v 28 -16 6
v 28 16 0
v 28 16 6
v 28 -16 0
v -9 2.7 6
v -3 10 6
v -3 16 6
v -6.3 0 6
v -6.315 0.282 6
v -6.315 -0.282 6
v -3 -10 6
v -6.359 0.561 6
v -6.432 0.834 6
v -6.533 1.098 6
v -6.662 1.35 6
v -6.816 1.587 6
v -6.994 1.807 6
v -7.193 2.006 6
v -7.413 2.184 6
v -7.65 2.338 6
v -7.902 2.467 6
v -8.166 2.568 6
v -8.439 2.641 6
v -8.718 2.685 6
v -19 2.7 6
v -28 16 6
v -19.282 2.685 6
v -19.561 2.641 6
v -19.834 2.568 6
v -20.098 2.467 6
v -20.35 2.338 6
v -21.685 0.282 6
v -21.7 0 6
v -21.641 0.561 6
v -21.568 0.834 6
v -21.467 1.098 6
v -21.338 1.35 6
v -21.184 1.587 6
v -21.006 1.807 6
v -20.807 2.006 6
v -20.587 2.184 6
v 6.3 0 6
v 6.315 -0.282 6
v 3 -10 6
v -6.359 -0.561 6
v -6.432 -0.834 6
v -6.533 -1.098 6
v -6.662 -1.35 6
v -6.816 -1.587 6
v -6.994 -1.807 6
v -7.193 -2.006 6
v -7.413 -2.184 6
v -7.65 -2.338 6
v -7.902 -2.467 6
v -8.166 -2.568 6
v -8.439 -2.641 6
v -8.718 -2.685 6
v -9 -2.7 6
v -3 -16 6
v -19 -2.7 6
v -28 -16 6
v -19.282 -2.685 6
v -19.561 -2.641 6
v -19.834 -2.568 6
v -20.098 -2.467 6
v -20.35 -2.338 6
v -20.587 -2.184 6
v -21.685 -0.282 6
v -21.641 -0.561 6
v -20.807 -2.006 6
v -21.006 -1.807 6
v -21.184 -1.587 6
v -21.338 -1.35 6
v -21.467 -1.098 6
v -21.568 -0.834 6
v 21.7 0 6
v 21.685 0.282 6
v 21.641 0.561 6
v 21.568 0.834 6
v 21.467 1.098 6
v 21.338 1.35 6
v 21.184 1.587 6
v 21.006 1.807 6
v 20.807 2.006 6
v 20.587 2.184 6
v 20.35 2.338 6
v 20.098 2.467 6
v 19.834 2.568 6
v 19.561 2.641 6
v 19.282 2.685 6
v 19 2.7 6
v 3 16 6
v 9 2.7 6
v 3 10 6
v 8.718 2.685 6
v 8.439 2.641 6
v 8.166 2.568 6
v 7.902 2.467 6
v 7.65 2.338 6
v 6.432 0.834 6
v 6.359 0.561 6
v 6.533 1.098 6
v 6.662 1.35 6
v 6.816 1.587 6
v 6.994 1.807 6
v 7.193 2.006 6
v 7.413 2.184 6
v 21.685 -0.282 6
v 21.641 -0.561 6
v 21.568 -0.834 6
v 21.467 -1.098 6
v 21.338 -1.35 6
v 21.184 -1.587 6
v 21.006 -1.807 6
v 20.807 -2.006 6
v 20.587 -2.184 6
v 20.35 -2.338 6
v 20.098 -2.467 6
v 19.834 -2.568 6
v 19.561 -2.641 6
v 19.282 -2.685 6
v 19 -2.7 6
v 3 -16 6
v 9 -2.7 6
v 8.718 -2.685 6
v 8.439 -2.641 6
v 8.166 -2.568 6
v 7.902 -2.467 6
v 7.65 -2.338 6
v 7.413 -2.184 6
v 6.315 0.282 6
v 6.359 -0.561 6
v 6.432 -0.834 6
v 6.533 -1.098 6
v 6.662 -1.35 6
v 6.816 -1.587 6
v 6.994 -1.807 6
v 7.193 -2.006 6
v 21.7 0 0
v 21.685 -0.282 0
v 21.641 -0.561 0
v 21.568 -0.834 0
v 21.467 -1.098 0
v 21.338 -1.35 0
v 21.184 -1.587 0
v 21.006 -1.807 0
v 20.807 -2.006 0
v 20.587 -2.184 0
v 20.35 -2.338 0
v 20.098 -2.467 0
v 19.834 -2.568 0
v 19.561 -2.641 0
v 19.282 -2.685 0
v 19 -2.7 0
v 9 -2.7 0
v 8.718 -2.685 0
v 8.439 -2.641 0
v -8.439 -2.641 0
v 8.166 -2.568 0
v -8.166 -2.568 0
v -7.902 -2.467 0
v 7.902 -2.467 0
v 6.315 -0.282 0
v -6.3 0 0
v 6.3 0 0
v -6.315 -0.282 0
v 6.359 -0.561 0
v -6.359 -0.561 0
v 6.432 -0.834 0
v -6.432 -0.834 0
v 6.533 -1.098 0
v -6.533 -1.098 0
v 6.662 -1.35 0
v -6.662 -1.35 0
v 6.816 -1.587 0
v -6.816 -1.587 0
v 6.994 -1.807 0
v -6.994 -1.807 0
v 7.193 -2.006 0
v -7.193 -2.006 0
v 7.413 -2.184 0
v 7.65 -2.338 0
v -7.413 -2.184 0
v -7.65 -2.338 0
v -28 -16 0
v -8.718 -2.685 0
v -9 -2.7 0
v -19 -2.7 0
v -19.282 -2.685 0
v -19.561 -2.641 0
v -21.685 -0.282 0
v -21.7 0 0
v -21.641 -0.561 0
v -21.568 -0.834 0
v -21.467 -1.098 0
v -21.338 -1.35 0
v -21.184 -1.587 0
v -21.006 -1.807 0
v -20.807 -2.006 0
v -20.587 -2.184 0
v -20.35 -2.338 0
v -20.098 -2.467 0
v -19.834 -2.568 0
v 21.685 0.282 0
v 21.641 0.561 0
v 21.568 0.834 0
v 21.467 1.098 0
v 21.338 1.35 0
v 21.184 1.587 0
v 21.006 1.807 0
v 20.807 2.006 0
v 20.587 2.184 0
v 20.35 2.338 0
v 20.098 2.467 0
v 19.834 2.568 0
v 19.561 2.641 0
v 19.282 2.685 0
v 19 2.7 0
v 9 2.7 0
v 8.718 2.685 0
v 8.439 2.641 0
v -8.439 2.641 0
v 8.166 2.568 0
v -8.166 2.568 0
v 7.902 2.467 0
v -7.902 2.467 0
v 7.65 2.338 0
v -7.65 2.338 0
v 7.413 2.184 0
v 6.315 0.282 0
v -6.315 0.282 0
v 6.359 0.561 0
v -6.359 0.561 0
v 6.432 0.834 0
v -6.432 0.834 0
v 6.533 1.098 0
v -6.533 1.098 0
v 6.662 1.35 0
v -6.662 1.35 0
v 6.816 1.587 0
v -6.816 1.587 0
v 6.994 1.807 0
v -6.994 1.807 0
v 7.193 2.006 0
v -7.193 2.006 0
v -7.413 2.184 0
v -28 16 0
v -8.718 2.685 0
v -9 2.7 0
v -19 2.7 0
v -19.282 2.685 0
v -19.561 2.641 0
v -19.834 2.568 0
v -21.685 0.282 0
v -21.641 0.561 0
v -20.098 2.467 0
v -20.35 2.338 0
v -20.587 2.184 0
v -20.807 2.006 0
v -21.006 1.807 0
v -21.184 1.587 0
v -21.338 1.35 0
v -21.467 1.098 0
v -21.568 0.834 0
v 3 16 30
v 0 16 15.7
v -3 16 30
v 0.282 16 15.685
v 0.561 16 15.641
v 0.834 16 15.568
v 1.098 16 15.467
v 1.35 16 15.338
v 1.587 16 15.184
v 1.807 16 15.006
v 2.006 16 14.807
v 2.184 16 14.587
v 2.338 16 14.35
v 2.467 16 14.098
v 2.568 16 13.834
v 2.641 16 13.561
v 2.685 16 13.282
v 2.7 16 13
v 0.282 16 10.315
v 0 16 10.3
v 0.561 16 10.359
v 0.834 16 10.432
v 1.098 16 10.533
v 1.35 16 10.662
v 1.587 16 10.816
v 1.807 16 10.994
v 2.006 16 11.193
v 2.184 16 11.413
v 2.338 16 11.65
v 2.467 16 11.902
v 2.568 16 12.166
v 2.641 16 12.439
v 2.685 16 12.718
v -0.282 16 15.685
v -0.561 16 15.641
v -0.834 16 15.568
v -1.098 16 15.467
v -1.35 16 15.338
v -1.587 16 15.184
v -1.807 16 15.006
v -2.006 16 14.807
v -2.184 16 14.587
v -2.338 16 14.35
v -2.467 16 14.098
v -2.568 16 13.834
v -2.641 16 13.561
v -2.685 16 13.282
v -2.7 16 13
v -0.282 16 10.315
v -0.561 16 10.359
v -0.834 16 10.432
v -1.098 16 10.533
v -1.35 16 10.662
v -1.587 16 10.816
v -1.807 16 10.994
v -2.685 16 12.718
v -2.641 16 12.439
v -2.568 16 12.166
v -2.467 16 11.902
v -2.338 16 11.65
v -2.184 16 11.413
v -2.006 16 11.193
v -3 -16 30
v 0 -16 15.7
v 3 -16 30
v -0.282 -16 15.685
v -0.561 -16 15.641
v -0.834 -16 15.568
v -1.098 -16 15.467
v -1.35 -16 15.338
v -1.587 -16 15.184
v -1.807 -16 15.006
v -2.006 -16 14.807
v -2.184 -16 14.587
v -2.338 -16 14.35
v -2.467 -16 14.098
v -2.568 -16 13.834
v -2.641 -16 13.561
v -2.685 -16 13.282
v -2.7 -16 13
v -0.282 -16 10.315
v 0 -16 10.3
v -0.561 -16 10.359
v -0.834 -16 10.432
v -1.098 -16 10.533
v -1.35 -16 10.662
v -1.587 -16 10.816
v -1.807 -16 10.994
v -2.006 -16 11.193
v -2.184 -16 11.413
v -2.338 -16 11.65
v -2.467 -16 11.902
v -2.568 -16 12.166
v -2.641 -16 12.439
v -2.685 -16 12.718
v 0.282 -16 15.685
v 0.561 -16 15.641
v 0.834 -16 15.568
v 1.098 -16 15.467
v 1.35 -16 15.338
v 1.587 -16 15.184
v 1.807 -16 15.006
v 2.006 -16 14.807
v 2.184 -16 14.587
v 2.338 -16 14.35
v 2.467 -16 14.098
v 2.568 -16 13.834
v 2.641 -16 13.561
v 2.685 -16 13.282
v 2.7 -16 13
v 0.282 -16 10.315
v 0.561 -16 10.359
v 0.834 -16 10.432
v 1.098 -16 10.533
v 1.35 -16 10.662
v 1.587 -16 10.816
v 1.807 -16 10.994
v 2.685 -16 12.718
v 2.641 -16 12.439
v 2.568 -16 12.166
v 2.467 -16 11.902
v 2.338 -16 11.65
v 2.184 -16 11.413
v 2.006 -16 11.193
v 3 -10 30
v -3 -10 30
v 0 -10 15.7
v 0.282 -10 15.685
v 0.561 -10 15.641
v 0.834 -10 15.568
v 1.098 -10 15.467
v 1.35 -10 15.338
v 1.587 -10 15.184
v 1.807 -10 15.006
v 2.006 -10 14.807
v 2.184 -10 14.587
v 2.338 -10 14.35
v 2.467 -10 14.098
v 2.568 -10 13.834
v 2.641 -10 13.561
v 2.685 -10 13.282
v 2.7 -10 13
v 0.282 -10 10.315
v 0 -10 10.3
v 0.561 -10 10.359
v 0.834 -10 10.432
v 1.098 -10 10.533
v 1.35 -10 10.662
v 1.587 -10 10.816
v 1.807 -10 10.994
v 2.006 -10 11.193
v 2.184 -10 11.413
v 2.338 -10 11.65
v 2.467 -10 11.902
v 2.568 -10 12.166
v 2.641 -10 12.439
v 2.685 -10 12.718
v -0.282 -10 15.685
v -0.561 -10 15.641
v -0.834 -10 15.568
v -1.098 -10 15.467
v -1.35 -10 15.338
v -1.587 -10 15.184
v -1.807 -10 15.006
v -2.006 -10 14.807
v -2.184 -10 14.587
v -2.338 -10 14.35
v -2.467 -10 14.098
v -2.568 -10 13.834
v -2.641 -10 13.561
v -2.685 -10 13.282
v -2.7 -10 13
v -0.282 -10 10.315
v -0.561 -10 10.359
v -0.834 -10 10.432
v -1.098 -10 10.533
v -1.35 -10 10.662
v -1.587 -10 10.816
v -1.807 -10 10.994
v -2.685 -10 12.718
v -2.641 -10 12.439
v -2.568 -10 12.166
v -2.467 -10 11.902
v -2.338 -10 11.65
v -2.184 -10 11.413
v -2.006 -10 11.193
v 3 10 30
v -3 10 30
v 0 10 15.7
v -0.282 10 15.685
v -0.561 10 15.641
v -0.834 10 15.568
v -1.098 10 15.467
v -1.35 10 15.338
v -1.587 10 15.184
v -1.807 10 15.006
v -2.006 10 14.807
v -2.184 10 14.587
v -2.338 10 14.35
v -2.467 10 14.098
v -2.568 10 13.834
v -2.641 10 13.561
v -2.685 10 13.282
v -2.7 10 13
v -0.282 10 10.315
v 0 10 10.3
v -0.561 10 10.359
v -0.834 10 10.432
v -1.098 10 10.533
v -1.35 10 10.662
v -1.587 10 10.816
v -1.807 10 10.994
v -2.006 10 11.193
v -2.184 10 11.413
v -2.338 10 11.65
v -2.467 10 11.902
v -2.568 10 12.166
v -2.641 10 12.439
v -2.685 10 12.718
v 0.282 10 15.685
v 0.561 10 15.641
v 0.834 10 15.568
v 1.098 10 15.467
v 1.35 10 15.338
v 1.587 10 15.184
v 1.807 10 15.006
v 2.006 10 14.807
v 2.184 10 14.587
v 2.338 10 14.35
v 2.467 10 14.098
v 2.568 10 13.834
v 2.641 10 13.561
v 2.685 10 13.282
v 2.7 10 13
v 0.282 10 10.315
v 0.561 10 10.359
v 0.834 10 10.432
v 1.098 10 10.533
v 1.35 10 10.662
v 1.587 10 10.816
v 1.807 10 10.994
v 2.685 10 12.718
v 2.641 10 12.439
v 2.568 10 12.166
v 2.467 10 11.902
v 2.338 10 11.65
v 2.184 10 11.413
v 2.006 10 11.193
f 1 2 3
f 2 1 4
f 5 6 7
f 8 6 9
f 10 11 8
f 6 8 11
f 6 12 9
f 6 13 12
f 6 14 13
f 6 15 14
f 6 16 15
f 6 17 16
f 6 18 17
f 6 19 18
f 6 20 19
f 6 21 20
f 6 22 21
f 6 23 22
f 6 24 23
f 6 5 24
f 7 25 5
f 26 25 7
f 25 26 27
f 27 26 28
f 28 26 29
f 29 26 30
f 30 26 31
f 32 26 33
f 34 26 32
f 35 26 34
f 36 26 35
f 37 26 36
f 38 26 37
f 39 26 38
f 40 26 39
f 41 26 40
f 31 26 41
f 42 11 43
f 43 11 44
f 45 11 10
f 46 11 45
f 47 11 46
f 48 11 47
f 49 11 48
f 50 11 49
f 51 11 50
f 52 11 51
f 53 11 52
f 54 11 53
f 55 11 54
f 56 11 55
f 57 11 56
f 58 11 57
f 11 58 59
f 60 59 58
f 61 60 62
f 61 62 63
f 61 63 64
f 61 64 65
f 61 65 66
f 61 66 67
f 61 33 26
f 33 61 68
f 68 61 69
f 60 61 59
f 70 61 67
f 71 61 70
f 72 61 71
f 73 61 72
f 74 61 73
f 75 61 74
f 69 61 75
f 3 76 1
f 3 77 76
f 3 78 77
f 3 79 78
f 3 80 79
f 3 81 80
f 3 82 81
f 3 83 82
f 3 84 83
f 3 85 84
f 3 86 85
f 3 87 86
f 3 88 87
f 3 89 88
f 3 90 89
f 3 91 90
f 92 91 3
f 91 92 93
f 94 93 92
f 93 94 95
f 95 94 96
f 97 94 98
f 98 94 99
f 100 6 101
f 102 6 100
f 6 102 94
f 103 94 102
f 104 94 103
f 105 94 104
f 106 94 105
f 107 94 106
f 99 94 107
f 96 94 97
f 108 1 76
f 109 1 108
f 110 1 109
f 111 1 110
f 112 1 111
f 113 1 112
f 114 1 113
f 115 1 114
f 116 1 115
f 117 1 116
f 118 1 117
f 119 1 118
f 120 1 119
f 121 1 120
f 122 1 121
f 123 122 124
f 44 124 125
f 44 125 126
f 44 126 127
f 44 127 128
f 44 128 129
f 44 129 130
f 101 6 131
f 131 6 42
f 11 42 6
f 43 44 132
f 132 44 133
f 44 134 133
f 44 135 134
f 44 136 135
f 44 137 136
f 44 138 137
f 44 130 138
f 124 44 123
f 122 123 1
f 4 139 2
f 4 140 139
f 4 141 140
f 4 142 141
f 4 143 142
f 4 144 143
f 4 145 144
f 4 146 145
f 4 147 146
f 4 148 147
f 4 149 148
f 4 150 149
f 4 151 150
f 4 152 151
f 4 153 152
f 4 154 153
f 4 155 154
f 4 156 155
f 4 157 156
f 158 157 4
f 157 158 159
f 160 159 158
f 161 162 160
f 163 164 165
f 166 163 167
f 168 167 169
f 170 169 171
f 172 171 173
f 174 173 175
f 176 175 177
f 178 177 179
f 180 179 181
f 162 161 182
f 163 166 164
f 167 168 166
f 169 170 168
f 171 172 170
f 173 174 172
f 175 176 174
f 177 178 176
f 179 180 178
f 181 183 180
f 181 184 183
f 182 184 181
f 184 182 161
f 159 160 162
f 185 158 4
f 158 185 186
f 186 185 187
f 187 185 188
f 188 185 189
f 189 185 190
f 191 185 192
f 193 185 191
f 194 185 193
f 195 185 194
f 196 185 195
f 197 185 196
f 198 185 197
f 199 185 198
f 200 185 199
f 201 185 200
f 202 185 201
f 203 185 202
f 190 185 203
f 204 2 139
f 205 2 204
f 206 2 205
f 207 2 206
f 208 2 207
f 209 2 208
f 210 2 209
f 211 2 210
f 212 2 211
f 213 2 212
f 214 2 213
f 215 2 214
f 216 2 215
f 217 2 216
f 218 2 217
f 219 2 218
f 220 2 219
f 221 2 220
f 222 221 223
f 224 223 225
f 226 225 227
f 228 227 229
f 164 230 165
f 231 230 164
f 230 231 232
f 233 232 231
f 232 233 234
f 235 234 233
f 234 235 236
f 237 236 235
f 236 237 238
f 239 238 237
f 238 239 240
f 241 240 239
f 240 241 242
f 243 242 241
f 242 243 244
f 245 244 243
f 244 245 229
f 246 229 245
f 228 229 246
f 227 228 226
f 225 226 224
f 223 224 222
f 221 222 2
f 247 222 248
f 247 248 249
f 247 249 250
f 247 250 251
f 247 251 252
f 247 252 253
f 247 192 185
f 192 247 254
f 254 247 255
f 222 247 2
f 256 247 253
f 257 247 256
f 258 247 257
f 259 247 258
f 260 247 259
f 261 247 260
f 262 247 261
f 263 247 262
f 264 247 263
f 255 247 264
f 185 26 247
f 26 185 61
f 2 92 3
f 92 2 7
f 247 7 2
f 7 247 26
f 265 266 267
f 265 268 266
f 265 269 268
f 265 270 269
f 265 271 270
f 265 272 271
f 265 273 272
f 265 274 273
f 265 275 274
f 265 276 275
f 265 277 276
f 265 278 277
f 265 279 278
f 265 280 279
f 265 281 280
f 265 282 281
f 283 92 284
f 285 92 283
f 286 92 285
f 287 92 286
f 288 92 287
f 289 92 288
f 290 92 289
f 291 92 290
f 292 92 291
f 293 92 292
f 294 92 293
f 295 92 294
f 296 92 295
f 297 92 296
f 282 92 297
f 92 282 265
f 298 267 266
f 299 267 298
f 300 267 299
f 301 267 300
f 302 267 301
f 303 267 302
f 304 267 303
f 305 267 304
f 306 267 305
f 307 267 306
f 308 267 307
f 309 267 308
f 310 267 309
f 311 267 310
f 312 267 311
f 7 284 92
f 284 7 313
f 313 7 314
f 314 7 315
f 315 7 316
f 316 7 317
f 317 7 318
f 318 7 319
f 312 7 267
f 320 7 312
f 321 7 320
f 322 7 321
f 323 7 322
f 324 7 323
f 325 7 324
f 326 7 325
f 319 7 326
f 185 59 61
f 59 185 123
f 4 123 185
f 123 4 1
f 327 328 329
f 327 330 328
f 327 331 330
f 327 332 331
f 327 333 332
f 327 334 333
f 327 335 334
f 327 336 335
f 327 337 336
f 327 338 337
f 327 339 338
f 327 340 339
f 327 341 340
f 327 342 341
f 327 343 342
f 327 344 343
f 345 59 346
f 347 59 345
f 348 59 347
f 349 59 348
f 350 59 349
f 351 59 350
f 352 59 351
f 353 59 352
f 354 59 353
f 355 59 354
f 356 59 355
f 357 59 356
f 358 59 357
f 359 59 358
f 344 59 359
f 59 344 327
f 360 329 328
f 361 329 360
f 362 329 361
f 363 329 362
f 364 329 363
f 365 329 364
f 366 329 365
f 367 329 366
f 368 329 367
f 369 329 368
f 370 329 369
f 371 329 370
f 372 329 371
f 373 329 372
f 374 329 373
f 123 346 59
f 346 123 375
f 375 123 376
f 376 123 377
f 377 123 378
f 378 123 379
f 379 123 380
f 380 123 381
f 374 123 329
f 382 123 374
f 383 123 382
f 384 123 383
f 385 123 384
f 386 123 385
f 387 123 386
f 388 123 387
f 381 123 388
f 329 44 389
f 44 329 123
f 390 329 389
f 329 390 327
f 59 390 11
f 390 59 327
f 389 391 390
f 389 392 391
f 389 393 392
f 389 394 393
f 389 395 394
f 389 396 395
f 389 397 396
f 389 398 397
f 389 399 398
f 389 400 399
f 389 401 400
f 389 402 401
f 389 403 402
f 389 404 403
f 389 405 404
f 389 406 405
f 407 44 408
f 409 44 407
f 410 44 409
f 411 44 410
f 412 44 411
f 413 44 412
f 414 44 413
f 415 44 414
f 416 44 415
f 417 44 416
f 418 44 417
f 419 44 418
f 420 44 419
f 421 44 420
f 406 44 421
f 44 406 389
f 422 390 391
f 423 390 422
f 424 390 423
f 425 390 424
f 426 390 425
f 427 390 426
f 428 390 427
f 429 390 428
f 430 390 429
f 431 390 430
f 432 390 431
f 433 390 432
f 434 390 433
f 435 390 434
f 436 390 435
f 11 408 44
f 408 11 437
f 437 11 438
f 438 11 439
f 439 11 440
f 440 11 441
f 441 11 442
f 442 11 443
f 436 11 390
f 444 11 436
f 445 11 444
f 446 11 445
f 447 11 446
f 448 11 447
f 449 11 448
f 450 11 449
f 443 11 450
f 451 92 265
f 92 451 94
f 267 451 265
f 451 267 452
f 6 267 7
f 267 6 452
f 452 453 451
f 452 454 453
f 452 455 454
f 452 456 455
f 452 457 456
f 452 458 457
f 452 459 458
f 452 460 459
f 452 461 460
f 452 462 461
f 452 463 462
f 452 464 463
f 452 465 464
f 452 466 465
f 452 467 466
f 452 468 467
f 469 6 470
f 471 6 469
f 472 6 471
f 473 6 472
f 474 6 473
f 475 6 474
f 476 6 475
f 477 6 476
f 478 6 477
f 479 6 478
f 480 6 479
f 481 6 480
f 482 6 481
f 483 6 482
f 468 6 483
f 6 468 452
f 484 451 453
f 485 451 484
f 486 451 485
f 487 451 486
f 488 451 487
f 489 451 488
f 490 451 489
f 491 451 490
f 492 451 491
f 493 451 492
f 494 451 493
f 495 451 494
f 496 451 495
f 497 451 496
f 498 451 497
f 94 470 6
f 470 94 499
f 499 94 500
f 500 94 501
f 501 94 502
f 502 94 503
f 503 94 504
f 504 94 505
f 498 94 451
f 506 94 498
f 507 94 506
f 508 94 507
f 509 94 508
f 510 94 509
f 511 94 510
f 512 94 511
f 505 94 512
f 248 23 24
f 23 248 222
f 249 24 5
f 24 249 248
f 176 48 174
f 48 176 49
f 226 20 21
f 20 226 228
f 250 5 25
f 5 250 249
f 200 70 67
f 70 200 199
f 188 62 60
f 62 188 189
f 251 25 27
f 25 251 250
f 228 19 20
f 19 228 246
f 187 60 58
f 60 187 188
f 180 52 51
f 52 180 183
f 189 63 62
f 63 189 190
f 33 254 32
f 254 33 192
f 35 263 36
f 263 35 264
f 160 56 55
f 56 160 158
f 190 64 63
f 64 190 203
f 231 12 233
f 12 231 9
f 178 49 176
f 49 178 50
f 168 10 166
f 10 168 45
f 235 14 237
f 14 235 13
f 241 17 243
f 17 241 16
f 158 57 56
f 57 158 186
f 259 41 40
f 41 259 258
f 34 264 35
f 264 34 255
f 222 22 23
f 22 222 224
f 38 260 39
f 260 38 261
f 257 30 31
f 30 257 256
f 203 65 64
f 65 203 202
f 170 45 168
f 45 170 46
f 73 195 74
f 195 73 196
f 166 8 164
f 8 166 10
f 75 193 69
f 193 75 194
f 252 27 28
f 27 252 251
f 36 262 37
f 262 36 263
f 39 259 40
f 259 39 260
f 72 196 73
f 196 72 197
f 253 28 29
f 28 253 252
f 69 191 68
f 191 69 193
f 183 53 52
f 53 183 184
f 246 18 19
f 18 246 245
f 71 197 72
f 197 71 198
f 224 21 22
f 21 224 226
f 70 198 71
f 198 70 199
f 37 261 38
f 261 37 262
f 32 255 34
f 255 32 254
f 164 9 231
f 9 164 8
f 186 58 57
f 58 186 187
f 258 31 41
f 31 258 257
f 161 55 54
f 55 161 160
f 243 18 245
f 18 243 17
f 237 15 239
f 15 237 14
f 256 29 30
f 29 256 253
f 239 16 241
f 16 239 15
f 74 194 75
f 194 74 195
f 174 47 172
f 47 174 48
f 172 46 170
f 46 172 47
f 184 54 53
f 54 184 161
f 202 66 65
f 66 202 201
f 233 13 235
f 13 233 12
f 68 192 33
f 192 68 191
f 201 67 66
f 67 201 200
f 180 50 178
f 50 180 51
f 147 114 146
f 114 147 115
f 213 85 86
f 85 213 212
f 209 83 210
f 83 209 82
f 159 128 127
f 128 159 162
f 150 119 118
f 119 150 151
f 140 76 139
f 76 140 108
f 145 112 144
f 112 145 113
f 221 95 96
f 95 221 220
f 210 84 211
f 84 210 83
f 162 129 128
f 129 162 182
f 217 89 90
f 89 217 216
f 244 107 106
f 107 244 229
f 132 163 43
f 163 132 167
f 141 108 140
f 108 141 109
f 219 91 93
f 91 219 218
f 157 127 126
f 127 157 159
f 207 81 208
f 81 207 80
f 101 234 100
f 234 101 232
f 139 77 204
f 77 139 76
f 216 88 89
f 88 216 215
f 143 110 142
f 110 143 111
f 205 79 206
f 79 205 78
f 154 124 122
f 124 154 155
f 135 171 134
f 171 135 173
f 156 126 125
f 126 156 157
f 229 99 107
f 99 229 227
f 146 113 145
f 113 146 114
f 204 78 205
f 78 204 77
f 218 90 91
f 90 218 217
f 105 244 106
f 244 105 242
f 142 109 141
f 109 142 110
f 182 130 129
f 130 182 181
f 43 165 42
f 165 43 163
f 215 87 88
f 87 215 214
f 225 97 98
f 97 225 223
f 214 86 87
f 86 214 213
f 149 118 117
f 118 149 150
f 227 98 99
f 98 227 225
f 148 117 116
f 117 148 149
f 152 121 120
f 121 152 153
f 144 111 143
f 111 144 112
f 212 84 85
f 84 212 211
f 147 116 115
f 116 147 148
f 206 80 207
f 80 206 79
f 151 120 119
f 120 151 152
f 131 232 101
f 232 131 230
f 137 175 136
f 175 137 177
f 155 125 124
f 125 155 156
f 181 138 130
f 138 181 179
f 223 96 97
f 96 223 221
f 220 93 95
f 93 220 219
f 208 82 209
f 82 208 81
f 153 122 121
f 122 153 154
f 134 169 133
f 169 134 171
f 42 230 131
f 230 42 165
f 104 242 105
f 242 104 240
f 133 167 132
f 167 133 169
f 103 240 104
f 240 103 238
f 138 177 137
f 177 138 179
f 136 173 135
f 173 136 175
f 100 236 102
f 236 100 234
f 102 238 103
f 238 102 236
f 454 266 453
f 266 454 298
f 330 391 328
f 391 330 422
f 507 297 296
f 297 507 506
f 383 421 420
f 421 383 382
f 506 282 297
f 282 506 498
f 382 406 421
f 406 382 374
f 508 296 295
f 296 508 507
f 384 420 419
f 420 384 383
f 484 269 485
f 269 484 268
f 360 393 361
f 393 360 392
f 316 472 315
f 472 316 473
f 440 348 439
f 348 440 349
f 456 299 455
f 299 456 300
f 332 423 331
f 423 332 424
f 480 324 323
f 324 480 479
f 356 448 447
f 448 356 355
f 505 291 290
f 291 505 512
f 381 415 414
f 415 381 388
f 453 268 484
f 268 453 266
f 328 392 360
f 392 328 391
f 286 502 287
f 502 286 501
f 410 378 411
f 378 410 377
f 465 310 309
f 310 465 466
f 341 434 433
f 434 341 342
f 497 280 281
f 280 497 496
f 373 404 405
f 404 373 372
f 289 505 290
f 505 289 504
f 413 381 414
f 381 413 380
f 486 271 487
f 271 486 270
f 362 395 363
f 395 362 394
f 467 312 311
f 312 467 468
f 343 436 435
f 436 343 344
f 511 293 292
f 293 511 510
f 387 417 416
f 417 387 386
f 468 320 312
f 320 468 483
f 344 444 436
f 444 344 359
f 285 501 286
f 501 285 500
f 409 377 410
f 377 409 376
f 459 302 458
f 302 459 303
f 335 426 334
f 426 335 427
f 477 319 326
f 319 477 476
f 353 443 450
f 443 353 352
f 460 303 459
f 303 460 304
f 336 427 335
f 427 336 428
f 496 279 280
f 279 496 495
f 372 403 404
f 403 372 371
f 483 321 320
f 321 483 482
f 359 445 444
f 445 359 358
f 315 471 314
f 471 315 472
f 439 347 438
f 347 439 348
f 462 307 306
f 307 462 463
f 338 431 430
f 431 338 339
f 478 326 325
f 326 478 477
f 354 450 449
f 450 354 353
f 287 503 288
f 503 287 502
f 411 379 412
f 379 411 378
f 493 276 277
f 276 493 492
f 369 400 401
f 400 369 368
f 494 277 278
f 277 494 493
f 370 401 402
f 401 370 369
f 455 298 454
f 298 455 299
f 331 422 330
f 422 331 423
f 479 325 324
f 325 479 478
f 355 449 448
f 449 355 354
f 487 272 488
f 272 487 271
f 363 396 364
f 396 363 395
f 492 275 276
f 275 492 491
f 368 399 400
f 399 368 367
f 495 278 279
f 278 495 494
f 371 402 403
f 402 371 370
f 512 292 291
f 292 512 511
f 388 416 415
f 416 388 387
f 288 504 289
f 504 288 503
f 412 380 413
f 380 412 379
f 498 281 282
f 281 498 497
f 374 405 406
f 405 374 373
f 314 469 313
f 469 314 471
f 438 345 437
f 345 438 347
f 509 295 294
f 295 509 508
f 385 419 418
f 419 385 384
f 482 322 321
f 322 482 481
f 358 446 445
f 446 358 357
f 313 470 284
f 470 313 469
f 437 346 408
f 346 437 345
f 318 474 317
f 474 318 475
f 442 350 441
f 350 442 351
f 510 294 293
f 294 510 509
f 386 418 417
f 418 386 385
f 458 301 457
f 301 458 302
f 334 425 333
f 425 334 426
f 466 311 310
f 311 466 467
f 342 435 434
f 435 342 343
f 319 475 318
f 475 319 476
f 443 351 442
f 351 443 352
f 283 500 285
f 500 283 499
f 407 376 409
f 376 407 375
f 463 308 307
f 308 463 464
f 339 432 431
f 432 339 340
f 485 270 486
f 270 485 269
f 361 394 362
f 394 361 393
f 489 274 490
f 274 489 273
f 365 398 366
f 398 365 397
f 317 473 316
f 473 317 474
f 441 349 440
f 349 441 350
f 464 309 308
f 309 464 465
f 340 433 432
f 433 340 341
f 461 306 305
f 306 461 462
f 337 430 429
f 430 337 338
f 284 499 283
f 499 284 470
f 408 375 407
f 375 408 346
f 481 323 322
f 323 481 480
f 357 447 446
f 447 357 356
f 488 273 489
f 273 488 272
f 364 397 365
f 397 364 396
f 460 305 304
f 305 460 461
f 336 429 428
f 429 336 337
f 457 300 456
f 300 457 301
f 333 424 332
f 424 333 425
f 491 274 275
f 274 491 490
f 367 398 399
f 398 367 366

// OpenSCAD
// U pivot bracket, 20 mm opening.
$fn = 60;
eps = 0.02;
base_l = 56;
base_w = 32;
base_t = 6;
ear_t = 6;
ear_h = 26;
pivot_d = 5.4;
module mount(x) {
    hull() {
        translate([x - 5, 0, -eps]) cylinder(d = 5.4, h = base_t + 2 * eps);
        translate([x + 5, 0, -eps]) cylinder(d = 5.4, h = base_t + 2 * eps);
    }
}
difference() {
    union() {
        translate([-base_l / 2, -base_w / 2, 0]) cube([base_l, base_w, base_t]);
        translate([-ear_t / 2, -base_w / 2, base_t - 2]) cube([ear_t, ear_t, ear_h]);
        translate([-ear_t / 2, base_w / 2 - ear_t, base_t - 2]) cube([ear_t, ear_t, ear_h]);
    }
    mount(-14); mount(14);
    translate([0, -base_w / 2 - eps, ear_h / 2]) rotate([-90, 0, 0]) cylinder(d = pivot_d, h = base_w + 2 * eps);
}
